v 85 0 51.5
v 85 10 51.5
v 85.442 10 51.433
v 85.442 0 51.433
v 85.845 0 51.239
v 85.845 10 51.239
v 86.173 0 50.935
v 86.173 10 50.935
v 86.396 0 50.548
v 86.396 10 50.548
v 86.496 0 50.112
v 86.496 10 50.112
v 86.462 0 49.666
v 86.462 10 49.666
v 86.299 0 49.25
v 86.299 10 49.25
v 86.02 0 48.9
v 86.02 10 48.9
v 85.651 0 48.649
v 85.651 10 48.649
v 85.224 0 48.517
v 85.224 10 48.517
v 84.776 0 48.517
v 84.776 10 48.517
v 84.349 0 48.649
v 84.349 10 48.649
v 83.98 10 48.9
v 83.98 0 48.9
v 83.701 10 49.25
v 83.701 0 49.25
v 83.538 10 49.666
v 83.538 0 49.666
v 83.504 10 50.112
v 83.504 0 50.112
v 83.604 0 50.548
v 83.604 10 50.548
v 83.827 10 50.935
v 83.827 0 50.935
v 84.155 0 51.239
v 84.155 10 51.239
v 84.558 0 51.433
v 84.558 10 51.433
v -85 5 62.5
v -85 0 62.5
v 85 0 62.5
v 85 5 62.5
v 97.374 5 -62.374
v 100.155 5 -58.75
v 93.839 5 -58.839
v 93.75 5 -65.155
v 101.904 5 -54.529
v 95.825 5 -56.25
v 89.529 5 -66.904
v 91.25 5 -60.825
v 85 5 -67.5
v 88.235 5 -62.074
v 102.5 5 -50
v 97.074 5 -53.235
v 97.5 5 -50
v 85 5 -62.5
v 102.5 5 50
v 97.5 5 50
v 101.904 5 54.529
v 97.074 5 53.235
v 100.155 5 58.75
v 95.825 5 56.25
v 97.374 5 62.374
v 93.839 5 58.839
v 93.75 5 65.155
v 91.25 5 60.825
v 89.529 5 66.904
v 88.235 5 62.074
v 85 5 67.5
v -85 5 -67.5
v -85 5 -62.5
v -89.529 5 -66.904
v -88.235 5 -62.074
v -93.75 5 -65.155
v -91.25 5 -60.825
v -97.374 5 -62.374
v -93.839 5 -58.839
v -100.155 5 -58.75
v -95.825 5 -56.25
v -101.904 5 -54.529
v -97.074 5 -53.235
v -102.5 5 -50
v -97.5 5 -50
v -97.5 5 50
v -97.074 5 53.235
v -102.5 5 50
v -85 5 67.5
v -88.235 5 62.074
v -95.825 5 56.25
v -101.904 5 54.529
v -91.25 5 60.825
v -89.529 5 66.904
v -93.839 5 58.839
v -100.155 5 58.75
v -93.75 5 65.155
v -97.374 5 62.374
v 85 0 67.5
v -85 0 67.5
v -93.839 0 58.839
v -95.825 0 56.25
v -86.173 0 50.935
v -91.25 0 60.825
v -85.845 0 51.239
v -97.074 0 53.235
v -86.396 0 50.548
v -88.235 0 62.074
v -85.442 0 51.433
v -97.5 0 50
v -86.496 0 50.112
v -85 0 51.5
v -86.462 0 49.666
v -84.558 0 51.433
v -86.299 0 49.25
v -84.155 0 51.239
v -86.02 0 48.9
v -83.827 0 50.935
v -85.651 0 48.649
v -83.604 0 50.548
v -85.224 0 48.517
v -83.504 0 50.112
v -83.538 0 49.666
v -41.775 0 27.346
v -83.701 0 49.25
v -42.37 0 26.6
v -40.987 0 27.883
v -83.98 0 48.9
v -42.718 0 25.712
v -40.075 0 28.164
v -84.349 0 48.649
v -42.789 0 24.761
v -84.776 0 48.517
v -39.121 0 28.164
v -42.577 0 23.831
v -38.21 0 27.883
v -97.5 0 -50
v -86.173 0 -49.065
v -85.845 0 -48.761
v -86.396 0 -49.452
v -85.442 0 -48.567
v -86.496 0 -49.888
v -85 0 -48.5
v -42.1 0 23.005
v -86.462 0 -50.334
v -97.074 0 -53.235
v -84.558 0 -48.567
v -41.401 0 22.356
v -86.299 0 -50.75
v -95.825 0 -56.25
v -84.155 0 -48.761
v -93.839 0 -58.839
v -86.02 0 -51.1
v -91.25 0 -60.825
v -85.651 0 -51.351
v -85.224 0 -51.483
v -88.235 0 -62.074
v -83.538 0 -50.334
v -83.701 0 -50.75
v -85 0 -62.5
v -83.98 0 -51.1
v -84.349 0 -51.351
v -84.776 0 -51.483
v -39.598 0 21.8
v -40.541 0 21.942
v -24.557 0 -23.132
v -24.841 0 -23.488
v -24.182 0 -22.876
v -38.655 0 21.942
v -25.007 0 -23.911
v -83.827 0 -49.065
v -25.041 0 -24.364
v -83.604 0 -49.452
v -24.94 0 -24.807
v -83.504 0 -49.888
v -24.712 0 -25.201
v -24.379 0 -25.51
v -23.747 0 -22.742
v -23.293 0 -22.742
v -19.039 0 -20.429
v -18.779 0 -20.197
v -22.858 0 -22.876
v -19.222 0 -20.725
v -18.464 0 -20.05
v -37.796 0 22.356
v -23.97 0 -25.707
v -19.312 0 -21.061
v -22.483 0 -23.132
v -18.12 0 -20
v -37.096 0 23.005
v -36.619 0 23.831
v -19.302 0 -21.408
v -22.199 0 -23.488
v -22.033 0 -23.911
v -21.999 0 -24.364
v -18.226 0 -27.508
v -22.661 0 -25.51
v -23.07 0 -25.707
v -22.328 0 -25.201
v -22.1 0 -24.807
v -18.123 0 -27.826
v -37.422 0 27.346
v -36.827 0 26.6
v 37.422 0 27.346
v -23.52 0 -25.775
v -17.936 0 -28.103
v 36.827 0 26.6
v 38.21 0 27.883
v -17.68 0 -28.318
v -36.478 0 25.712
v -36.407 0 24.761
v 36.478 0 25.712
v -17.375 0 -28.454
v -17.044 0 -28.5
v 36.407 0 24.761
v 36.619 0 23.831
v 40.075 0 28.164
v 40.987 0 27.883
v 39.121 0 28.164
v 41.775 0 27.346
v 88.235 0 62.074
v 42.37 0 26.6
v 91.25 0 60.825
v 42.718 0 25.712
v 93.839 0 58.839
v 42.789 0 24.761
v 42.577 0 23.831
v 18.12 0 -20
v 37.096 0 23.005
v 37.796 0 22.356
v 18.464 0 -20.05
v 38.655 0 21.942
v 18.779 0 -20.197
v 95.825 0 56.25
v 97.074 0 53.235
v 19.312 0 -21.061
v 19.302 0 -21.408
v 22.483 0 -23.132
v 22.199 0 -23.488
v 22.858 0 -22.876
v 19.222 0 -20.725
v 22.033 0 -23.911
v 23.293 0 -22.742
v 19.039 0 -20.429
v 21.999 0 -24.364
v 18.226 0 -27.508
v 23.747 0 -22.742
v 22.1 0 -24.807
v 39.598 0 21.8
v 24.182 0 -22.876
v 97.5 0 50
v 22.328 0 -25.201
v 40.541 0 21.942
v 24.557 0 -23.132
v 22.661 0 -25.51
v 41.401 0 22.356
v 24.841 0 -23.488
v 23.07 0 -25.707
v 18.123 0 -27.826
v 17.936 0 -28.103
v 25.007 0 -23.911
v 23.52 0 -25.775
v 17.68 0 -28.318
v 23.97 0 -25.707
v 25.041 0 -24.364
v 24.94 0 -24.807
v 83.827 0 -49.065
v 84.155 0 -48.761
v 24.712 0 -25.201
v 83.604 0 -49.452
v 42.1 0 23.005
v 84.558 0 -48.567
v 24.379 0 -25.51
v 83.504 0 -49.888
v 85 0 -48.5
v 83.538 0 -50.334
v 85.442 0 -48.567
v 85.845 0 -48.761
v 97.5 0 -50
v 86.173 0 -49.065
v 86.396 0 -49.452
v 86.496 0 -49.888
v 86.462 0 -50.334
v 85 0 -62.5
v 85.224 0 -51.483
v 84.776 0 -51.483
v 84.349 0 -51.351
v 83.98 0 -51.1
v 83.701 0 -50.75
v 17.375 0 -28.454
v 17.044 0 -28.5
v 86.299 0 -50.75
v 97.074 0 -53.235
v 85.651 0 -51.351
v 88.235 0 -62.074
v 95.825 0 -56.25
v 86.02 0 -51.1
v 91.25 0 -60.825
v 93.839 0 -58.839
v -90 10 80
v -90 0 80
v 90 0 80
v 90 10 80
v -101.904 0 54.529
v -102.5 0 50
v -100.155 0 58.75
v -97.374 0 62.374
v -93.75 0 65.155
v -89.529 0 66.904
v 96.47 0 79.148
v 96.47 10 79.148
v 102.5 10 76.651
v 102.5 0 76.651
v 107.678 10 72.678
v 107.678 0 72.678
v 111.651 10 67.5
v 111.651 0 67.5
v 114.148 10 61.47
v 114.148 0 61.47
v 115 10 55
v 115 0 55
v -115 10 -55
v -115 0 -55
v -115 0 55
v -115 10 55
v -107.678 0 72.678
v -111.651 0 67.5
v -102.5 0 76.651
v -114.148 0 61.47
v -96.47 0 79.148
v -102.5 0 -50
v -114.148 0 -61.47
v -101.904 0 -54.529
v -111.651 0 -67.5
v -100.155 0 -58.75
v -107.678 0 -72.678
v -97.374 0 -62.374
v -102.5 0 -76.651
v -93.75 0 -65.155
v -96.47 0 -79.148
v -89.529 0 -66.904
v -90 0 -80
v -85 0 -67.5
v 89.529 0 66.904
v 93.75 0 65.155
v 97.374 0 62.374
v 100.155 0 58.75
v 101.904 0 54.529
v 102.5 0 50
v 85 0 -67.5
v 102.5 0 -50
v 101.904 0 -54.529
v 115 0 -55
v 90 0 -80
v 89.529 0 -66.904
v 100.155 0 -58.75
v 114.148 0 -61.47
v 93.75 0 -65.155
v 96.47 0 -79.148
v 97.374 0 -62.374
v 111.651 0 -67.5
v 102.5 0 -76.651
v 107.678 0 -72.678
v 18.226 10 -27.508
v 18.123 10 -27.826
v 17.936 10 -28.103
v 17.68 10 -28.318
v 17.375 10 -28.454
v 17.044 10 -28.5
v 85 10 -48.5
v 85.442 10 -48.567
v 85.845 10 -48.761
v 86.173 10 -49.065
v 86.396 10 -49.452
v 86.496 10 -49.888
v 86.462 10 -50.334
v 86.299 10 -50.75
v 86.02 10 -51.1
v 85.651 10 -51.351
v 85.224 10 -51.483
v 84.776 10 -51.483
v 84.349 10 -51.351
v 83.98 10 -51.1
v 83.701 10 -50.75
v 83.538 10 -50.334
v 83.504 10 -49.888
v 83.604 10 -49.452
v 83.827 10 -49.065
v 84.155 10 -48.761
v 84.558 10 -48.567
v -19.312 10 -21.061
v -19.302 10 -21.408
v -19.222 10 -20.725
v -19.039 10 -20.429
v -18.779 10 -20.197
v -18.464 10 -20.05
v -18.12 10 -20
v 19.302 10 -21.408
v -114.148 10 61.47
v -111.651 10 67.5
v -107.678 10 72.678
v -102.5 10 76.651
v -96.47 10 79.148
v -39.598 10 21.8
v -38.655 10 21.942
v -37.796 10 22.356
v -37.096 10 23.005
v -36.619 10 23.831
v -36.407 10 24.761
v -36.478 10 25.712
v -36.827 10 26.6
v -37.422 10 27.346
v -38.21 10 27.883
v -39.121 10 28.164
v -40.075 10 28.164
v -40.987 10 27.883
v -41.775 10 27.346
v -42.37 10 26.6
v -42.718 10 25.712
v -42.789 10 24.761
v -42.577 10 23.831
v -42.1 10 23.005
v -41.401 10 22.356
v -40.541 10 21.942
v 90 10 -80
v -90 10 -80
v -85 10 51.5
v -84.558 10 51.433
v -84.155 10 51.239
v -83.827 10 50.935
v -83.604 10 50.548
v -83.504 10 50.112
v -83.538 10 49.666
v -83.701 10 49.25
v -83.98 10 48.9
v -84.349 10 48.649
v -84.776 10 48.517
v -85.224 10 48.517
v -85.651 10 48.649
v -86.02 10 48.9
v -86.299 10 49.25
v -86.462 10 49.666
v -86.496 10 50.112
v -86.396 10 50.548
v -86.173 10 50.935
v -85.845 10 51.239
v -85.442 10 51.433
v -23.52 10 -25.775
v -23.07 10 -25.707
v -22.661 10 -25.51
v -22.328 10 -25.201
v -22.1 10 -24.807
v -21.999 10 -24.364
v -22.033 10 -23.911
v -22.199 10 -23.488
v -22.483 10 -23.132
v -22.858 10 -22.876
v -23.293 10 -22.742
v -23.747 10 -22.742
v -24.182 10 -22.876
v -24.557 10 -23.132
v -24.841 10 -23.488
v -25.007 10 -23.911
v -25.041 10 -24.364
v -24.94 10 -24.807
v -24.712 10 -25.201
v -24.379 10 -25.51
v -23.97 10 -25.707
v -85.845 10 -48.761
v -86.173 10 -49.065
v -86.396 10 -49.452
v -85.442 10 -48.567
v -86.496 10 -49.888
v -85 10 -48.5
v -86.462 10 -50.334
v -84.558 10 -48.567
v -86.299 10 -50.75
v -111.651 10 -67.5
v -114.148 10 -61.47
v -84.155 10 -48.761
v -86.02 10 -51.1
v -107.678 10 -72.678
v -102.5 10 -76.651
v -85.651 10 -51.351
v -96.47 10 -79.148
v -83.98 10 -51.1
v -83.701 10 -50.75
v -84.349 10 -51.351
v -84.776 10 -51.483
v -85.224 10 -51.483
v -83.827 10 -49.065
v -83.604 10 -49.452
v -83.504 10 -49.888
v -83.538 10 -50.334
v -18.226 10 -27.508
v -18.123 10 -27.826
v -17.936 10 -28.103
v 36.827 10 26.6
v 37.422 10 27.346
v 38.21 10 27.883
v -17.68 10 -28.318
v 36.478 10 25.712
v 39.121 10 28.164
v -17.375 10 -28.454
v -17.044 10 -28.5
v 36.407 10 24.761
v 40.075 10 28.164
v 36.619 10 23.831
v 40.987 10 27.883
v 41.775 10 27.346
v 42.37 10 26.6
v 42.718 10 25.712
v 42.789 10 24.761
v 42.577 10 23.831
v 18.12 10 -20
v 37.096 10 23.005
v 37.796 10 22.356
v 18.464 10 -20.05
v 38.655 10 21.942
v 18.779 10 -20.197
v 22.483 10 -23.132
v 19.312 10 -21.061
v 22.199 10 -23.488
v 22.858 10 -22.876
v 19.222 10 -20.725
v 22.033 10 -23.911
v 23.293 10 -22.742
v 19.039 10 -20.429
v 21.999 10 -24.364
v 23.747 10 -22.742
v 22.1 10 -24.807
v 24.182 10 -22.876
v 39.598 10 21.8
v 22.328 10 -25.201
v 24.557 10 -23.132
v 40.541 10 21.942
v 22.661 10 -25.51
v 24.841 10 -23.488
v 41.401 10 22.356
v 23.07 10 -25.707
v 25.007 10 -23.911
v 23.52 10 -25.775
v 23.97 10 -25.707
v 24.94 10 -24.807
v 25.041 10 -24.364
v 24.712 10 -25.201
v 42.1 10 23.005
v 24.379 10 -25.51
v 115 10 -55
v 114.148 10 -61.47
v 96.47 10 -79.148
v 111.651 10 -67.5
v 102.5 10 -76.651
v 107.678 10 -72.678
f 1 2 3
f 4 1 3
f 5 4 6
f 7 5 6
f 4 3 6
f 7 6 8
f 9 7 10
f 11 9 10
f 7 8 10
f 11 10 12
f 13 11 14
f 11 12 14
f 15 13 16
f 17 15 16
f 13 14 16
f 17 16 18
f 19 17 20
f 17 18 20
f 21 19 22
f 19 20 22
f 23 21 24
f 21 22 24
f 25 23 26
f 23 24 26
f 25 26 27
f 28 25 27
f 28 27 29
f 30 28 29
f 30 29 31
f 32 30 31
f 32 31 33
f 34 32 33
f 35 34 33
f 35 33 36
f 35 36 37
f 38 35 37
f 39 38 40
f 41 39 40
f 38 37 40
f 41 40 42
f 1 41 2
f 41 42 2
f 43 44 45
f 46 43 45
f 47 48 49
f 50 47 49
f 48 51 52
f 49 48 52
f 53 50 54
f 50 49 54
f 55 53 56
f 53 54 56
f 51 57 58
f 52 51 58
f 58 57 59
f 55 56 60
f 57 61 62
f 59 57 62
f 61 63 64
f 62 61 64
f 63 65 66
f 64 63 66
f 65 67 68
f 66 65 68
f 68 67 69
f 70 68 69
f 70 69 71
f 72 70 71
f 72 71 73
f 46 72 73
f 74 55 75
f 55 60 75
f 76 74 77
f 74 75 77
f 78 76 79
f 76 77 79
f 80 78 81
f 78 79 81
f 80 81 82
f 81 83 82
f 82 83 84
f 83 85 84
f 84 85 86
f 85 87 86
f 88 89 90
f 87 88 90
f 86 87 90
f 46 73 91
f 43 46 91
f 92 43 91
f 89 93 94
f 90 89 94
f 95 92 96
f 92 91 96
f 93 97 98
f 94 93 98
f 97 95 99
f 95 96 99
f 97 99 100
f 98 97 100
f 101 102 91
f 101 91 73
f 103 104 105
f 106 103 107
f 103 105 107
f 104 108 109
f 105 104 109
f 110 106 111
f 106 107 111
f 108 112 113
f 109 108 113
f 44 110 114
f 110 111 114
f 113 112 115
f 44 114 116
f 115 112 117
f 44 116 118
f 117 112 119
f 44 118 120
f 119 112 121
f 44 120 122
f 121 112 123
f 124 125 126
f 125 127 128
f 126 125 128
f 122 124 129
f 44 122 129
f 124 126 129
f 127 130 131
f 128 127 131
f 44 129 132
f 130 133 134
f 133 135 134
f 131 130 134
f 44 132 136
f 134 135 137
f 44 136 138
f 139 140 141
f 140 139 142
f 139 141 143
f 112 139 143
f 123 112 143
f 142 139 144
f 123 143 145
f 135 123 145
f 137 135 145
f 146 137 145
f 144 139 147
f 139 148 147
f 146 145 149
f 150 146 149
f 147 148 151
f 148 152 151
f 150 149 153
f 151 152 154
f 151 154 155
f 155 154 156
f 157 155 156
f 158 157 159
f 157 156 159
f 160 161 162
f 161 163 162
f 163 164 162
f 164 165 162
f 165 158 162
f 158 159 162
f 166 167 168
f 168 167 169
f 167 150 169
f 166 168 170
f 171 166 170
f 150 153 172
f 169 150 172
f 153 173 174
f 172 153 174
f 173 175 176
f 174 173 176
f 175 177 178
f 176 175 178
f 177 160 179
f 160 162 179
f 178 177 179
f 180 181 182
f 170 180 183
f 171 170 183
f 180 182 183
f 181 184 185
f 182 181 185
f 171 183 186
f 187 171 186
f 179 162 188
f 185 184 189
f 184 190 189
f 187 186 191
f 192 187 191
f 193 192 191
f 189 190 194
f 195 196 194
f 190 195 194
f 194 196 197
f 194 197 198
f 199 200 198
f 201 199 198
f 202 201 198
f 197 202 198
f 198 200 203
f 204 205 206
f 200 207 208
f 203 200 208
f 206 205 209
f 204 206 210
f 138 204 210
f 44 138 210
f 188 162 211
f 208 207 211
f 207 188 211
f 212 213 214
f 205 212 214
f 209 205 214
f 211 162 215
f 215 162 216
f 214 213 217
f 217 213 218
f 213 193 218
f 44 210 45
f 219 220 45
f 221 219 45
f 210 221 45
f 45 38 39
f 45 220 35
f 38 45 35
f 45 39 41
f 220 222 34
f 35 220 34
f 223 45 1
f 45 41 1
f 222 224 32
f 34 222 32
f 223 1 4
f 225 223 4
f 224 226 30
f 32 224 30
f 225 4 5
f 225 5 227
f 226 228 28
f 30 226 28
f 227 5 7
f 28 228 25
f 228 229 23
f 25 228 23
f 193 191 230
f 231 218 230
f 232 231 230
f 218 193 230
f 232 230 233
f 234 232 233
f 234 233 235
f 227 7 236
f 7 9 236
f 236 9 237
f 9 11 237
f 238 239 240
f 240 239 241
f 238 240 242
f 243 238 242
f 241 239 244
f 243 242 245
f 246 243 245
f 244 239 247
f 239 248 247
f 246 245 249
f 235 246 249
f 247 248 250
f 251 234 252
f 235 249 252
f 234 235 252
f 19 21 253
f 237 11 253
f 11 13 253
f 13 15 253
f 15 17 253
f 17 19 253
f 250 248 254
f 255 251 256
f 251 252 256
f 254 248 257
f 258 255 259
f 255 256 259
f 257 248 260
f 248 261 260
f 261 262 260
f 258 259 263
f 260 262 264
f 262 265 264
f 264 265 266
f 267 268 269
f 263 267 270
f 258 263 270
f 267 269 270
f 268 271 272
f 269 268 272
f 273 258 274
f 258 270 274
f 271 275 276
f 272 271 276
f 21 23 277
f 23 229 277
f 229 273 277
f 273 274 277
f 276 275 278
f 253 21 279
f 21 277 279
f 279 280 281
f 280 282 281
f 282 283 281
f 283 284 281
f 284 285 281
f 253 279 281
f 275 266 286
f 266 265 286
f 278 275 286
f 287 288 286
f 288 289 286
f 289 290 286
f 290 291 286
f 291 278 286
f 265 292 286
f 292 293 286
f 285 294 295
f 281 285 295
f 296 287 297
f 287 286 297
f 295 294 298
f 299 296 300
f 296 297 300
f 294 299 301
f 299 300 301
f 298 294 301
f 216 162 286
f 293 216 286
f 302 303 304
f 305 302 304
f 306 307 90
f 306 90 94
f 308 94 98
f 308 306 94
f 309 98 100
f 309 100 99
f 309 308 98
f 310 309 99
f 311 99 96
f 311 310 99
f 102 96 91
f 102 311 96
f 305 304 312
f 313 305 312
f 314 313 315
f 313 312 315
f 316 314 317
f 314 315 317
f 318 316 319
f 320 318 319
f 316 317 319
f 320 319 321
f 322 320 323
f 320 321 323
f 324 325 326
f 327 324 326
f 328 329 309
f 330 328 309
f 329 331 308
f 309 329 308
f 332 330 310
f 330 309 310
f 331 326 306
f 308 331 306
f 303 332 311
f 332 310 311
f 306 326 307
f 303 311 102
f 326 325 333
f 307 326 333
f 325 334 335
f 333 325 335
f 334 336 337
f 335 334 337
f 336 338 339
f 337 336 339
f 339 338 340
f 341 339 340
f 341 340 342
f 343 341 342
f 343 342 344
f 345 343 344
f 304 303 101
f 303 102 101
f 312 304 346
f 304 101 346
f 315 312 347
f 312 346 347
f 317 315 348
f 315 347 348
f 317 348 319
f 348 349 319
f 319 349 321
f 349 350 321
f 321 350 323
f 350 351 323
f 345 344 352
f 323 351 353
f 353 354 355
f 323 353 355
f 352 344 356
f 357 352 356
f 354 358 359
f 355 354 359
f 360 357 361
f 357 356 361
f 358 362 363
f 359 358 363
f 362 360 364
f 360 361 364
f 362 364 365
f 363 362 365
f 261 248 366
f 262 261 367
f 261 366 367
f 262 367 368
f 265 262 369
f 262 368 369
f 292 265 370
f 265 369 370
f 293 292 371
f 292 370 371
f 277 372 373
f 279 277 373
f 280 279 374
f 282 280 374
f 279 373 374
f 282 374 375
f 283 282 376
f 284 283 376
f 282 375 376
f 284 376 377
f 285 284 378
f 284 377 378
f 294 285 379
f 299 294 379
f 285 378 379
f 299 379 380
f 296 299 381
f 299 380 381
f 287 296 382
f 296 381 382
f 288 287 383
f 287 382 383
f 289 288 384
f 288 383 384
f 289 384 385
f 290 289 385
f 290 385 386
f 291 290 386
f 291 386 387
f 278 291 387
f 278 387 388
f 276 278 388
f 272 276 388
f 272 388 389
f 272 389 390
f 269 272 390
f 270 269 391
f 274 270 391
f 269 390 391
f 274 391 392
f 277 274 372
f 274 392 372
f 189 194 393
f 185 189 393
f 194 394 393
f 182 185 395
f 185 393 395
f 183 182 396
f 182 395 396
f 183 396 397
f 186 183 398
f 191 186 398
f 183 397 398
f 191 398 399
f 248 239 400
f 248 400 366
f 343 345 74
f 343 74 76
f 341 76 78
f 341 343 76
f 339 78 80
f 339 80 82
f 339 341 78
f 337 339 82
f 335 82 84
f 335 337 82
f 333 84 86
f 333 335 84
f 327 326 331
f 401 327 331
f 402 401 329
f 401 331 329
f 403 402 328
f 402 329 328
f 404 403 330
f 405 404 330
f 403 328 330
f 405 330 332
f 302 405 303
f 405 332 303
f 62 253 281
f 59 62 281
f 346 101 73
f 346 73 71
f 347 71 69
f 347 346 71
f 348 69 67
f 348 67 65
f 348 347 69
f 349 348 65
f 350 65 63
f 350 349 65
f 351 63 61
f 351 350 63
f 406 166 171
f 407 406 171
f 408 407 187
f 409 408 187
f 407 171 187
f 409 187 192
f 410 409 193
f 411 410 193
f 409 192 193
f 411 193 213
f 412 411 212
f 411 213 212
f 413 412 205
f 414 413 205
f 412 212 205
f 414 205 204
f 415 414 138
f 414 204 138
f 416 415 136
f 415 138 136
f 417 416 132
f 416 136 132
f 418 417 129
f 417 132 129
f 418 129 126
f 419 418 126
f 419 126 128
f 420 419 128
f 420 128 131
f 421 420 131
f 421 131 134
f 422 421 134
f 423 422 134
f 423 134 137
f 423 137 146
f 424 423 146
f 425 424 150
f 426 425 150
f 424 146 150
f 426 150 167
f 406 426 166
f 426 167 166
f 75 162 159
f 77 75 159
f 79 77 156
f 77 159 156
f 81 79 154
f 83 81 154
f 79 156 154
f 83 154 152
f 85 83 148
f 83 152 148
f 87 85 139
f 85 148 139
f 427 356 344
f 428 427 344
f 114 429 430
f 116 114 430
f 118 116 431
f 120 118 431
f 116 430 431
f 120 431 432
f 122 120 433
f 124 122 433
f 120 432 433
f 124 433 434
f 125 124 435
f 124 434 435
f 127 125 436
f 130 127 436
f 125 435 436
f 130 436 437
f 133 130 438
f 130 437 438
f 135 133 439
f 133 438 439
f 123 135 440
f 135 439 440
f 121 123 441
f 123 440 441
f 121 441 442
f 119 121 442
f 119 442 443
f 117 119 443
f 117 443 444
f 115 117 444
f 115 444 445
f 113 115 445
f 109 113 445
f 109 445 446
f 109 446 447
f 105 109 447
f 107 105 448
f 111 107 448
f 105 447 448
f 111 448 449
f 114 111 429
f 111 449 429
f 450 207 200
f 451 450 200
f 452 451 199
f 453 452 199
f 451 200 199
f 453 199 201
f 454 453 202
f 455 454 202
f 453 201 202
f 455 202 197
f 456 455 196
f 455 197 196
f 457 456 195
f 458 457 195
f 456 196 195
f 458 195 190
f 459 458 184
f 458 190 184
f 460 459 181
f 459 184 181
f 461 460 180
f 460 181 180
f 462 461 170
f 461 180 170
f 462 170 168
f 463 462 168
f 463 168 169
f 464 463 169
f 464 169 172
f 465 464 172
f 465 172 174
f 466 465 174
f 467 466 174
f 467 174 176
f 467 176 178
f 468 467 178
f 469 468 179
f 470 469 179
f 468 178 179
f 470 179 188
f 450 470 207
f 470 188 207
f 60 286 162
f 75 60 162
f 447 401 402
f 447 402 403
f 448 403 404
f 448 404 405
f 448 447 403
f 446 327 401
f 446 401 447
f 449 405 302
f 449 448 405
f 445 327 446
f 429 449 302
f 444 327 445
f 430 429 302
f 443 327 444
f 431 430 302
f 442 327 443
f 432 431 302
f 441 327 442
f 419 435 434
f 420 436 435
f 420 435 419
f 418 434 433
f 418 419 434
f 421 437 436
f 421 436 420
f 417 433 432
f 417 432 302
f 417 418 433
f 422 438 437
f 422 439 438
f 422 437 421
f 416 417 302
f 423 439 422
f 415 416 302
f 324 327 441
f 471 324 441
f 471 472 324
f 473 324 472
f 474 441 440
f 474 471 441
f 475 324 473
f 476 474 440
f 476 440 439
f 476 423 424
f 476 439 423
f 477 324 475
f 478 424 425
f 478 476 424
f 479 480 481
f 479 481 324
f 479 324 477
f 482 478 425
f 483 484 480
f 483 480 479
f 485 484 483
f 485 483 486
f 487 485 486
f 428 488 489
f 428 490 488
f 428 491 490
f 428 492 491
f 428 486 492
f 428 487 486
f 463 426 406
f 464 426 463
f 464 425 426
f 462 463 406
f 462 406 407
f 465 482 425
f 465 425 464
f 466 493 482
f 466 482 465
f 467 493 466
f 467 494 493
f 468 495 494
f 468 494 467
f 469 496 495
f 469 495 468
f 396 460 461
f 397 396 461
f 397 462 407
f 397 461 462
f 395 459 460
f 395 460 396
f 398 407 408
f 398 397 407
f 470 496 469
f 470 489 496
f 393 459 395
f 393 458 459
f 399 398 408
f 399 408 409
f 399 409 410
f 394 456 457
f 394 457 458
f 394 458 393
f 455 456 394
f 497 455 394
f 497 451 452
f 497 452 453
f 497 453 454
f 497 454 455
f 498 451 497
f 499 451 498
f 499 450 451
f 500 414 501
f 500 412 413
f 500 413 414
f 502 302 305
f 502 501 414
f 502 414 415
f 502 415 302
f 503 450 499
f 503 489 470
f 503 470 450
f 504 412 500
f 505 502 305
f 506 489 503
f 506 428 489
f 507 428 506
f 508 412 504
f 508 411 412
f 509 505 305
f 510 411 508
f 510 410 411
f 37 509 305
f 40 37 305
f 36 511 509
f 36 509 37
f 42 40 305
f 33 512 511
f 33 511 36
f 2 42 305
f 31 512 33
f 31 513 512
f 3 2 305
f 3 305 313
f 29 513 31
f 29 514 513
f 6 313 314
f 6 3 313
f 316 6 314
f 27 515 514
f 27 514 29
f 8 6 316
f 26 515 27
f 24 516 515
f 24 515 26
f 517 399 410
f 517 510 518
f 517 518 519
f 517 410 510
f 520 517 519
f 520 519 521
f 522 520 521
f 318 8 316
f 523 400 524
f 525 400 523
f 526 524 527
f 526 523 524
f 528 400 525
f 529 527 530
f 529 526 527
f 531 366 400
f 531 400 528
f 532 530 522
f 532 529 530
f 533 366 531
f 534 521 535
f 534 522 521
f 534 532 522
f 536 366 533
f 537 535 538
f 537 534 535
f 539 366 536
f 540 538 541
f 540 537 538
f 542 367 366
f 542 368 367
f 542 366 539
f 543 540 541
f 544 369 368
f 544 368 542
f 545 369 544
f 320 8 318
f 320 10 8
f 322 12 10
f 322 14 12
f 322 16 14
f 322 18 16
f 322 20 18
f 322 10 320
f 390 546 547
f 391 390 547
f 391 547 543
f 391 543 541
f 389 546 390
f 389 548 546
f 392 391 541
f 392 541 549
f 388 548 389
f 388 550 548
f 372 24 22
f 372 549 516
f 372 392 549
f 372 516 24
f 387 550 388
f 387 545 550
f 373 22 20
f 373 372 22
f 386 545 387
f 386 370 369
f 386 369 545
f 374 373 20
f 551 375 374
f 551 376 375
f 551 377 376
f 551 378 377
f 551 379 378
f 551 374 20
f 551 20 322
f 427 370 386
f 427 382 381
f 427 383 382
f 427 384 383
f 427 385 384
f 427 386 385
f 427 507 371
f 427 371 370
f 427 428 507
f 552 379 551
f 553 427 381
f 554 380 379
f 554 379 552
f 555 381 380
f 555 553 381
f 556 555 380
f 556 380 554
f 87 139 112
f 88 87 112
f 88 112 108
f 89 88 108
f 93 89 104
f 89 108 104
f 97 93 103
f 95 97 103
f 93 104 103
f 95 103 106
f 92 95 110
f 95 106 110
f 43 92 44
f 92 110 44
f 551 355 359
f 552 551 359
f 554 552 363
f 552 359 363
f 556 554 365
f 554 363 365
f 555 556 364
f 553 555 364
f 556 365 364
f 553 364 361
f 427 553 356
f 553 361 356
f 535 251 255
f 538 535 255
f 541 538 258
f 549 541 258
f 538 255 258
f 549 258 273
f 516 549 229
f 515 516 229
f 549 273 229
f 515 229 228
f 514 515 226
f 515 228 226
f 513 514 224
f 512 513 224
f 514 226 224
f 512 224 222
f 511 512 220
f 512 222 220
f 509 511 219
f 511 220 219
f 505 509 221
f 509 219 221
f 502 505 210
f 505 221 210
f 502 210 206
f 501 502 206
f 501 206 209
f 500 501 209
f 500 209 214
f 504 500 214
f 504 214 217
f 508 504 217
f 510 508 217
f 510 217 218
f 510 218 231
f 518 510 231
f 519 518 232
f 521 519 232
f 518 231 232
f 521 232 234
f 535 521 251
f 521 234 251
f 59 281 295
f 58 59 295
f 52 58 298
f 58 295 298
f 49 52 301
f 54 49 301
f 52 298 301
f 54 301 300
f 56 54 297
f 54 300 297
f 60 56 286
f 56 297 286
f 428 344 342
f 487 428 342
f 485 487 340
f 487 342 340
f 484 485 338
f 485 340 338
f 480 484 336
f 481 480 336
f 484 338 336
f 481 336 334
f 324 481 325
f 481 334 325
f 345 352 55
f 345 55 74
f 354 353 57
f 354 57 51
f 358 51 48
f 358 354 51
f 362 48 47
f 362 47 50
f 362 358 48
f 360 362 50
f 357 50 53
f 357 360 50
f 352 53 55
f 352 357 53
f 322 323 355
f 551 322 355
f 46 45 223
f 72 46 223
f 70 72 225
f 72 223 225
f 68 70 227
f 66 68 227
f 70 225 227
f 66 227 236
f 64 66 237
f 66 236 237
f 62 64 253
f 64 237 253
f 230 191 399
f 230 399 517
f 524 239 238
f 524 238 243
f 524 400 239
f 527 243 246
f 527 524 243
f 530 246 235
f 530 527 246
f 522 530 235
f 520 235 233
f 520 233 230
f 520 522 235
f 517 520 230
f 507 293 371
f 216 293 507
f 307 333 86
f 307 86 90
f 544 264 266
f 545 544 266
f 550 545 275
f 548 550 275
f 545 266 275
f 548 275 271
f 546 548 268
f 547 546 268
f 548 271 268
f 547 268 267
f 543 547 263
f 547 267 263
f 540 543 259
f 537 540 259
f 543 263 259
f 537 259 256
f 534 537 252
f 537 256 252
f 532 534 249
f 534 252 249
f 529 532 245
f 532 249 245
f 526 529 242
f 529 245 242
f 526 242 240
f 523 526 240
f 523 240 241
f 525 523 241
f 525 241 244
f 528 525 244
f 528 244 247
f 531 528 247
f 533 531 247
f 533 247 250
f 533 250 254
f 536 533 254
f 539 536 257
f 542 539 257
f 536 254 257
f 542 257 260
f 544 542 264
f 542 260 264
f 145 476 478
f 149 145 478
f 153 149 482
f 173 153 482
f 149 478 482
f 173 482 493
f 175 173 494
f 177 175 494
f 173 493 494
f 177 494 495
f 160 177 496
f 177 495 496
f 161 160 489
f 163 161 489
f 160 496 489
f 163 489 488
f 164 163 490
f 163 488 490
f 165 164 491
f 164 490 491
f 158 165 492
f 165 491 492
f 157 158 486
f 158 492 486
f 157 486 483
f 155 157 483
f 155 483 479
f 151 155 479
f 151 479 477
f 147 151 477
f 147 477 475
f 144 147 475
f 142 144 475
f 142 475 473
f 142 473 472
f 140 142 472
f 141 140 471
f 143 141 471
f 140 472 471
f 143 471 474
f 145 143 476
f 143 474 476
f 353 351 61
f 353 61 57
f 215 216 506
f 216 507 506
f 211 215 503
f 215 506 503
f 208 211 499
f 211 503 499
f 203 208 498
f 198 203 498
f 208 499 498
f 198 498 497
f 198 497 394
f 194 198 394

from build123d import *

# Parameters (mm, degrees)
BOSS_EXTRUDE1_DEPTH     = 10
SKETCH3_R               = 1.5
CUT_EXTRUDE1_DEPTH      = 10
SKETCH5_R               = 1.525
SKETCH5_R_2             = 3.2
CUT_EXTRUDE2_DEPTH      = 10
FILLET1_R               = 1.2
CUT_EXTRUDE_THIN1_DEPTH = 5


with BuildPart() as part:
    # Sketch1 → Boss-Extrude1 (new body)
    with BuildSketch(Plane(origin=(0, 0, 0), x_dir=(1, 0, 0), z_dir=(0, 1, 0))):
        with BuildLine():
            Line((-90, -80), (90, -80))
            ThreePointArc((90, -80), (107.67766953, -72.67766953), (115, -55))
            Line((115, -55), (115, 55))
            ThreePointArc((115, 55), (107.67766953, 72.67766953), (90, 80))
            Line((90, 80), (-90, 80))
            ThreePointArc((-90, 80), (-107.67766953, 72.67766953), (-115, 55))
            Line((-115, 55), (-115, -55))
            ThreePointArc((-115, -55), (-107.67766953, -72.67766953), (-90, -80))
        make_face()
    extrude(amount=BOSS_EXTRUDE1_DEPTH)

    # Sketch3 → Cut-Extrude1 (cut)
    with BuildSketch(Plane(origin=(0, 10, 0), x_dir=(1, 0, 0), z_dir=(0, 1, 0))):
        with Locations(Location((-85, 50, 0), (0, 0, 270))):
            Circle(SKETCH3_R)
        with Locations(Location((85, 50, 0), (0, 0, 270))):
            Circle(SKETCH3_R)
        with Locations(Location((85, -50, 0), (0, 0, 270))):
            Circle(SKETCH3_R)
        with Locations(Location((-85, -50, 0), (0, 0, 270))):
            Circle(SKETCH3_R)
    extrude(amount=-CUT_EXTRUDE1_DEPTH, mode=Mode.SUBTRACT)

    # Sketch5 → Cut-Extrude2 (cut)
    with BuildSketch(Plane.XZ):
        with Locations(Location((23.52, -24.25, 0), (0, 0, 270))):
            Circle(SKETCH5_R)
        with Locations(Location((-23.52, -24.25, 0), (0, 0, 270))):
            Circle(SKETCH5_R)
        with Locations(Location((-39.598222878, 25, 0), (0, 0, 270))):
            Circle(SKETCH5_R_2)
        with Locations(Location((39.598222878, 25, 0), (0, 0, 270))):
            Circle(SKETCH5_R_2)
        Polygon((19.55, -20), (18.051220664, -28.5), (-18.051220664, -28.5), (-19.55, -20), align=None)
    extrude(amount=-CUT_EXTRUDE2_DEPTH, mode=Mode.SUBTRACT)

    # Fillet1
    fillet1_edges = [part.edges().sort_by_distance(p)[0] for p in [
        (-18.051220664, 5, -28.5),
        (-19.55, 5, -20),
        (19.55, 5, -20),
        (18.051220664, 5, -28.5),
    ]]
    fillet(fillet1_edges, radius=FILLET1_R)

    # Sketch7 → Cut-Extrude-Thin1 (cut)
    with BuildSketch(Plane.XZ):
        with BuildLine():
            Line((-85, 67.5), (85, 67.5))
            ThreePointArc((85, 67.5), (97.374368671, 62.374368671), (102.5, 50))
            Line((102.5, 50), (102.5, -50))
            ThreePointArc((102.5, -50), (97.374368671, -62.374368671), (85, -67.5))
            Line((85, -67.5), (-85, -67.5))
            ThreePointArc((-85, -67.5), (-97.374368671, -62.374368671), (-102.5, -50))
            Line((-102.5, -50), (-102.5, 50))
            ThreePointArc((-102.5, 50), (-97.374368671, 62.374368671), (-85, 67.5))
        make_face()
        with BuildLine():
            Line((-85, 62.5), (85, 62.5))
            ThreePointArc((85, 62.5), (93.838834765, 58.838834765), (97.5, 50))
            Line((97.5, 50), (97.5, -50))
            ThreePointArc((97.5, -50), (93.838834765, -58.838834765), (85, -62.5))
            Line((85, -62.5), (-85, -62.5))
            ThreePointArc((-85, -62.5), (-93.838834765, -58.838834765), (-97.5, -50))
            Line((-97.5, -50), (-97.5, 50))
            ThreePointArc((-97.5, 50), (-93.838834765, 58.838834765), (-85, 62.5))
        make_face(mode=Mode.SUBTRACT)
    extrude(amount=-CUT_EXTRUDE_THIN1_DEPTH, mode=Mode.SUBTRACT)


solid = part.part
